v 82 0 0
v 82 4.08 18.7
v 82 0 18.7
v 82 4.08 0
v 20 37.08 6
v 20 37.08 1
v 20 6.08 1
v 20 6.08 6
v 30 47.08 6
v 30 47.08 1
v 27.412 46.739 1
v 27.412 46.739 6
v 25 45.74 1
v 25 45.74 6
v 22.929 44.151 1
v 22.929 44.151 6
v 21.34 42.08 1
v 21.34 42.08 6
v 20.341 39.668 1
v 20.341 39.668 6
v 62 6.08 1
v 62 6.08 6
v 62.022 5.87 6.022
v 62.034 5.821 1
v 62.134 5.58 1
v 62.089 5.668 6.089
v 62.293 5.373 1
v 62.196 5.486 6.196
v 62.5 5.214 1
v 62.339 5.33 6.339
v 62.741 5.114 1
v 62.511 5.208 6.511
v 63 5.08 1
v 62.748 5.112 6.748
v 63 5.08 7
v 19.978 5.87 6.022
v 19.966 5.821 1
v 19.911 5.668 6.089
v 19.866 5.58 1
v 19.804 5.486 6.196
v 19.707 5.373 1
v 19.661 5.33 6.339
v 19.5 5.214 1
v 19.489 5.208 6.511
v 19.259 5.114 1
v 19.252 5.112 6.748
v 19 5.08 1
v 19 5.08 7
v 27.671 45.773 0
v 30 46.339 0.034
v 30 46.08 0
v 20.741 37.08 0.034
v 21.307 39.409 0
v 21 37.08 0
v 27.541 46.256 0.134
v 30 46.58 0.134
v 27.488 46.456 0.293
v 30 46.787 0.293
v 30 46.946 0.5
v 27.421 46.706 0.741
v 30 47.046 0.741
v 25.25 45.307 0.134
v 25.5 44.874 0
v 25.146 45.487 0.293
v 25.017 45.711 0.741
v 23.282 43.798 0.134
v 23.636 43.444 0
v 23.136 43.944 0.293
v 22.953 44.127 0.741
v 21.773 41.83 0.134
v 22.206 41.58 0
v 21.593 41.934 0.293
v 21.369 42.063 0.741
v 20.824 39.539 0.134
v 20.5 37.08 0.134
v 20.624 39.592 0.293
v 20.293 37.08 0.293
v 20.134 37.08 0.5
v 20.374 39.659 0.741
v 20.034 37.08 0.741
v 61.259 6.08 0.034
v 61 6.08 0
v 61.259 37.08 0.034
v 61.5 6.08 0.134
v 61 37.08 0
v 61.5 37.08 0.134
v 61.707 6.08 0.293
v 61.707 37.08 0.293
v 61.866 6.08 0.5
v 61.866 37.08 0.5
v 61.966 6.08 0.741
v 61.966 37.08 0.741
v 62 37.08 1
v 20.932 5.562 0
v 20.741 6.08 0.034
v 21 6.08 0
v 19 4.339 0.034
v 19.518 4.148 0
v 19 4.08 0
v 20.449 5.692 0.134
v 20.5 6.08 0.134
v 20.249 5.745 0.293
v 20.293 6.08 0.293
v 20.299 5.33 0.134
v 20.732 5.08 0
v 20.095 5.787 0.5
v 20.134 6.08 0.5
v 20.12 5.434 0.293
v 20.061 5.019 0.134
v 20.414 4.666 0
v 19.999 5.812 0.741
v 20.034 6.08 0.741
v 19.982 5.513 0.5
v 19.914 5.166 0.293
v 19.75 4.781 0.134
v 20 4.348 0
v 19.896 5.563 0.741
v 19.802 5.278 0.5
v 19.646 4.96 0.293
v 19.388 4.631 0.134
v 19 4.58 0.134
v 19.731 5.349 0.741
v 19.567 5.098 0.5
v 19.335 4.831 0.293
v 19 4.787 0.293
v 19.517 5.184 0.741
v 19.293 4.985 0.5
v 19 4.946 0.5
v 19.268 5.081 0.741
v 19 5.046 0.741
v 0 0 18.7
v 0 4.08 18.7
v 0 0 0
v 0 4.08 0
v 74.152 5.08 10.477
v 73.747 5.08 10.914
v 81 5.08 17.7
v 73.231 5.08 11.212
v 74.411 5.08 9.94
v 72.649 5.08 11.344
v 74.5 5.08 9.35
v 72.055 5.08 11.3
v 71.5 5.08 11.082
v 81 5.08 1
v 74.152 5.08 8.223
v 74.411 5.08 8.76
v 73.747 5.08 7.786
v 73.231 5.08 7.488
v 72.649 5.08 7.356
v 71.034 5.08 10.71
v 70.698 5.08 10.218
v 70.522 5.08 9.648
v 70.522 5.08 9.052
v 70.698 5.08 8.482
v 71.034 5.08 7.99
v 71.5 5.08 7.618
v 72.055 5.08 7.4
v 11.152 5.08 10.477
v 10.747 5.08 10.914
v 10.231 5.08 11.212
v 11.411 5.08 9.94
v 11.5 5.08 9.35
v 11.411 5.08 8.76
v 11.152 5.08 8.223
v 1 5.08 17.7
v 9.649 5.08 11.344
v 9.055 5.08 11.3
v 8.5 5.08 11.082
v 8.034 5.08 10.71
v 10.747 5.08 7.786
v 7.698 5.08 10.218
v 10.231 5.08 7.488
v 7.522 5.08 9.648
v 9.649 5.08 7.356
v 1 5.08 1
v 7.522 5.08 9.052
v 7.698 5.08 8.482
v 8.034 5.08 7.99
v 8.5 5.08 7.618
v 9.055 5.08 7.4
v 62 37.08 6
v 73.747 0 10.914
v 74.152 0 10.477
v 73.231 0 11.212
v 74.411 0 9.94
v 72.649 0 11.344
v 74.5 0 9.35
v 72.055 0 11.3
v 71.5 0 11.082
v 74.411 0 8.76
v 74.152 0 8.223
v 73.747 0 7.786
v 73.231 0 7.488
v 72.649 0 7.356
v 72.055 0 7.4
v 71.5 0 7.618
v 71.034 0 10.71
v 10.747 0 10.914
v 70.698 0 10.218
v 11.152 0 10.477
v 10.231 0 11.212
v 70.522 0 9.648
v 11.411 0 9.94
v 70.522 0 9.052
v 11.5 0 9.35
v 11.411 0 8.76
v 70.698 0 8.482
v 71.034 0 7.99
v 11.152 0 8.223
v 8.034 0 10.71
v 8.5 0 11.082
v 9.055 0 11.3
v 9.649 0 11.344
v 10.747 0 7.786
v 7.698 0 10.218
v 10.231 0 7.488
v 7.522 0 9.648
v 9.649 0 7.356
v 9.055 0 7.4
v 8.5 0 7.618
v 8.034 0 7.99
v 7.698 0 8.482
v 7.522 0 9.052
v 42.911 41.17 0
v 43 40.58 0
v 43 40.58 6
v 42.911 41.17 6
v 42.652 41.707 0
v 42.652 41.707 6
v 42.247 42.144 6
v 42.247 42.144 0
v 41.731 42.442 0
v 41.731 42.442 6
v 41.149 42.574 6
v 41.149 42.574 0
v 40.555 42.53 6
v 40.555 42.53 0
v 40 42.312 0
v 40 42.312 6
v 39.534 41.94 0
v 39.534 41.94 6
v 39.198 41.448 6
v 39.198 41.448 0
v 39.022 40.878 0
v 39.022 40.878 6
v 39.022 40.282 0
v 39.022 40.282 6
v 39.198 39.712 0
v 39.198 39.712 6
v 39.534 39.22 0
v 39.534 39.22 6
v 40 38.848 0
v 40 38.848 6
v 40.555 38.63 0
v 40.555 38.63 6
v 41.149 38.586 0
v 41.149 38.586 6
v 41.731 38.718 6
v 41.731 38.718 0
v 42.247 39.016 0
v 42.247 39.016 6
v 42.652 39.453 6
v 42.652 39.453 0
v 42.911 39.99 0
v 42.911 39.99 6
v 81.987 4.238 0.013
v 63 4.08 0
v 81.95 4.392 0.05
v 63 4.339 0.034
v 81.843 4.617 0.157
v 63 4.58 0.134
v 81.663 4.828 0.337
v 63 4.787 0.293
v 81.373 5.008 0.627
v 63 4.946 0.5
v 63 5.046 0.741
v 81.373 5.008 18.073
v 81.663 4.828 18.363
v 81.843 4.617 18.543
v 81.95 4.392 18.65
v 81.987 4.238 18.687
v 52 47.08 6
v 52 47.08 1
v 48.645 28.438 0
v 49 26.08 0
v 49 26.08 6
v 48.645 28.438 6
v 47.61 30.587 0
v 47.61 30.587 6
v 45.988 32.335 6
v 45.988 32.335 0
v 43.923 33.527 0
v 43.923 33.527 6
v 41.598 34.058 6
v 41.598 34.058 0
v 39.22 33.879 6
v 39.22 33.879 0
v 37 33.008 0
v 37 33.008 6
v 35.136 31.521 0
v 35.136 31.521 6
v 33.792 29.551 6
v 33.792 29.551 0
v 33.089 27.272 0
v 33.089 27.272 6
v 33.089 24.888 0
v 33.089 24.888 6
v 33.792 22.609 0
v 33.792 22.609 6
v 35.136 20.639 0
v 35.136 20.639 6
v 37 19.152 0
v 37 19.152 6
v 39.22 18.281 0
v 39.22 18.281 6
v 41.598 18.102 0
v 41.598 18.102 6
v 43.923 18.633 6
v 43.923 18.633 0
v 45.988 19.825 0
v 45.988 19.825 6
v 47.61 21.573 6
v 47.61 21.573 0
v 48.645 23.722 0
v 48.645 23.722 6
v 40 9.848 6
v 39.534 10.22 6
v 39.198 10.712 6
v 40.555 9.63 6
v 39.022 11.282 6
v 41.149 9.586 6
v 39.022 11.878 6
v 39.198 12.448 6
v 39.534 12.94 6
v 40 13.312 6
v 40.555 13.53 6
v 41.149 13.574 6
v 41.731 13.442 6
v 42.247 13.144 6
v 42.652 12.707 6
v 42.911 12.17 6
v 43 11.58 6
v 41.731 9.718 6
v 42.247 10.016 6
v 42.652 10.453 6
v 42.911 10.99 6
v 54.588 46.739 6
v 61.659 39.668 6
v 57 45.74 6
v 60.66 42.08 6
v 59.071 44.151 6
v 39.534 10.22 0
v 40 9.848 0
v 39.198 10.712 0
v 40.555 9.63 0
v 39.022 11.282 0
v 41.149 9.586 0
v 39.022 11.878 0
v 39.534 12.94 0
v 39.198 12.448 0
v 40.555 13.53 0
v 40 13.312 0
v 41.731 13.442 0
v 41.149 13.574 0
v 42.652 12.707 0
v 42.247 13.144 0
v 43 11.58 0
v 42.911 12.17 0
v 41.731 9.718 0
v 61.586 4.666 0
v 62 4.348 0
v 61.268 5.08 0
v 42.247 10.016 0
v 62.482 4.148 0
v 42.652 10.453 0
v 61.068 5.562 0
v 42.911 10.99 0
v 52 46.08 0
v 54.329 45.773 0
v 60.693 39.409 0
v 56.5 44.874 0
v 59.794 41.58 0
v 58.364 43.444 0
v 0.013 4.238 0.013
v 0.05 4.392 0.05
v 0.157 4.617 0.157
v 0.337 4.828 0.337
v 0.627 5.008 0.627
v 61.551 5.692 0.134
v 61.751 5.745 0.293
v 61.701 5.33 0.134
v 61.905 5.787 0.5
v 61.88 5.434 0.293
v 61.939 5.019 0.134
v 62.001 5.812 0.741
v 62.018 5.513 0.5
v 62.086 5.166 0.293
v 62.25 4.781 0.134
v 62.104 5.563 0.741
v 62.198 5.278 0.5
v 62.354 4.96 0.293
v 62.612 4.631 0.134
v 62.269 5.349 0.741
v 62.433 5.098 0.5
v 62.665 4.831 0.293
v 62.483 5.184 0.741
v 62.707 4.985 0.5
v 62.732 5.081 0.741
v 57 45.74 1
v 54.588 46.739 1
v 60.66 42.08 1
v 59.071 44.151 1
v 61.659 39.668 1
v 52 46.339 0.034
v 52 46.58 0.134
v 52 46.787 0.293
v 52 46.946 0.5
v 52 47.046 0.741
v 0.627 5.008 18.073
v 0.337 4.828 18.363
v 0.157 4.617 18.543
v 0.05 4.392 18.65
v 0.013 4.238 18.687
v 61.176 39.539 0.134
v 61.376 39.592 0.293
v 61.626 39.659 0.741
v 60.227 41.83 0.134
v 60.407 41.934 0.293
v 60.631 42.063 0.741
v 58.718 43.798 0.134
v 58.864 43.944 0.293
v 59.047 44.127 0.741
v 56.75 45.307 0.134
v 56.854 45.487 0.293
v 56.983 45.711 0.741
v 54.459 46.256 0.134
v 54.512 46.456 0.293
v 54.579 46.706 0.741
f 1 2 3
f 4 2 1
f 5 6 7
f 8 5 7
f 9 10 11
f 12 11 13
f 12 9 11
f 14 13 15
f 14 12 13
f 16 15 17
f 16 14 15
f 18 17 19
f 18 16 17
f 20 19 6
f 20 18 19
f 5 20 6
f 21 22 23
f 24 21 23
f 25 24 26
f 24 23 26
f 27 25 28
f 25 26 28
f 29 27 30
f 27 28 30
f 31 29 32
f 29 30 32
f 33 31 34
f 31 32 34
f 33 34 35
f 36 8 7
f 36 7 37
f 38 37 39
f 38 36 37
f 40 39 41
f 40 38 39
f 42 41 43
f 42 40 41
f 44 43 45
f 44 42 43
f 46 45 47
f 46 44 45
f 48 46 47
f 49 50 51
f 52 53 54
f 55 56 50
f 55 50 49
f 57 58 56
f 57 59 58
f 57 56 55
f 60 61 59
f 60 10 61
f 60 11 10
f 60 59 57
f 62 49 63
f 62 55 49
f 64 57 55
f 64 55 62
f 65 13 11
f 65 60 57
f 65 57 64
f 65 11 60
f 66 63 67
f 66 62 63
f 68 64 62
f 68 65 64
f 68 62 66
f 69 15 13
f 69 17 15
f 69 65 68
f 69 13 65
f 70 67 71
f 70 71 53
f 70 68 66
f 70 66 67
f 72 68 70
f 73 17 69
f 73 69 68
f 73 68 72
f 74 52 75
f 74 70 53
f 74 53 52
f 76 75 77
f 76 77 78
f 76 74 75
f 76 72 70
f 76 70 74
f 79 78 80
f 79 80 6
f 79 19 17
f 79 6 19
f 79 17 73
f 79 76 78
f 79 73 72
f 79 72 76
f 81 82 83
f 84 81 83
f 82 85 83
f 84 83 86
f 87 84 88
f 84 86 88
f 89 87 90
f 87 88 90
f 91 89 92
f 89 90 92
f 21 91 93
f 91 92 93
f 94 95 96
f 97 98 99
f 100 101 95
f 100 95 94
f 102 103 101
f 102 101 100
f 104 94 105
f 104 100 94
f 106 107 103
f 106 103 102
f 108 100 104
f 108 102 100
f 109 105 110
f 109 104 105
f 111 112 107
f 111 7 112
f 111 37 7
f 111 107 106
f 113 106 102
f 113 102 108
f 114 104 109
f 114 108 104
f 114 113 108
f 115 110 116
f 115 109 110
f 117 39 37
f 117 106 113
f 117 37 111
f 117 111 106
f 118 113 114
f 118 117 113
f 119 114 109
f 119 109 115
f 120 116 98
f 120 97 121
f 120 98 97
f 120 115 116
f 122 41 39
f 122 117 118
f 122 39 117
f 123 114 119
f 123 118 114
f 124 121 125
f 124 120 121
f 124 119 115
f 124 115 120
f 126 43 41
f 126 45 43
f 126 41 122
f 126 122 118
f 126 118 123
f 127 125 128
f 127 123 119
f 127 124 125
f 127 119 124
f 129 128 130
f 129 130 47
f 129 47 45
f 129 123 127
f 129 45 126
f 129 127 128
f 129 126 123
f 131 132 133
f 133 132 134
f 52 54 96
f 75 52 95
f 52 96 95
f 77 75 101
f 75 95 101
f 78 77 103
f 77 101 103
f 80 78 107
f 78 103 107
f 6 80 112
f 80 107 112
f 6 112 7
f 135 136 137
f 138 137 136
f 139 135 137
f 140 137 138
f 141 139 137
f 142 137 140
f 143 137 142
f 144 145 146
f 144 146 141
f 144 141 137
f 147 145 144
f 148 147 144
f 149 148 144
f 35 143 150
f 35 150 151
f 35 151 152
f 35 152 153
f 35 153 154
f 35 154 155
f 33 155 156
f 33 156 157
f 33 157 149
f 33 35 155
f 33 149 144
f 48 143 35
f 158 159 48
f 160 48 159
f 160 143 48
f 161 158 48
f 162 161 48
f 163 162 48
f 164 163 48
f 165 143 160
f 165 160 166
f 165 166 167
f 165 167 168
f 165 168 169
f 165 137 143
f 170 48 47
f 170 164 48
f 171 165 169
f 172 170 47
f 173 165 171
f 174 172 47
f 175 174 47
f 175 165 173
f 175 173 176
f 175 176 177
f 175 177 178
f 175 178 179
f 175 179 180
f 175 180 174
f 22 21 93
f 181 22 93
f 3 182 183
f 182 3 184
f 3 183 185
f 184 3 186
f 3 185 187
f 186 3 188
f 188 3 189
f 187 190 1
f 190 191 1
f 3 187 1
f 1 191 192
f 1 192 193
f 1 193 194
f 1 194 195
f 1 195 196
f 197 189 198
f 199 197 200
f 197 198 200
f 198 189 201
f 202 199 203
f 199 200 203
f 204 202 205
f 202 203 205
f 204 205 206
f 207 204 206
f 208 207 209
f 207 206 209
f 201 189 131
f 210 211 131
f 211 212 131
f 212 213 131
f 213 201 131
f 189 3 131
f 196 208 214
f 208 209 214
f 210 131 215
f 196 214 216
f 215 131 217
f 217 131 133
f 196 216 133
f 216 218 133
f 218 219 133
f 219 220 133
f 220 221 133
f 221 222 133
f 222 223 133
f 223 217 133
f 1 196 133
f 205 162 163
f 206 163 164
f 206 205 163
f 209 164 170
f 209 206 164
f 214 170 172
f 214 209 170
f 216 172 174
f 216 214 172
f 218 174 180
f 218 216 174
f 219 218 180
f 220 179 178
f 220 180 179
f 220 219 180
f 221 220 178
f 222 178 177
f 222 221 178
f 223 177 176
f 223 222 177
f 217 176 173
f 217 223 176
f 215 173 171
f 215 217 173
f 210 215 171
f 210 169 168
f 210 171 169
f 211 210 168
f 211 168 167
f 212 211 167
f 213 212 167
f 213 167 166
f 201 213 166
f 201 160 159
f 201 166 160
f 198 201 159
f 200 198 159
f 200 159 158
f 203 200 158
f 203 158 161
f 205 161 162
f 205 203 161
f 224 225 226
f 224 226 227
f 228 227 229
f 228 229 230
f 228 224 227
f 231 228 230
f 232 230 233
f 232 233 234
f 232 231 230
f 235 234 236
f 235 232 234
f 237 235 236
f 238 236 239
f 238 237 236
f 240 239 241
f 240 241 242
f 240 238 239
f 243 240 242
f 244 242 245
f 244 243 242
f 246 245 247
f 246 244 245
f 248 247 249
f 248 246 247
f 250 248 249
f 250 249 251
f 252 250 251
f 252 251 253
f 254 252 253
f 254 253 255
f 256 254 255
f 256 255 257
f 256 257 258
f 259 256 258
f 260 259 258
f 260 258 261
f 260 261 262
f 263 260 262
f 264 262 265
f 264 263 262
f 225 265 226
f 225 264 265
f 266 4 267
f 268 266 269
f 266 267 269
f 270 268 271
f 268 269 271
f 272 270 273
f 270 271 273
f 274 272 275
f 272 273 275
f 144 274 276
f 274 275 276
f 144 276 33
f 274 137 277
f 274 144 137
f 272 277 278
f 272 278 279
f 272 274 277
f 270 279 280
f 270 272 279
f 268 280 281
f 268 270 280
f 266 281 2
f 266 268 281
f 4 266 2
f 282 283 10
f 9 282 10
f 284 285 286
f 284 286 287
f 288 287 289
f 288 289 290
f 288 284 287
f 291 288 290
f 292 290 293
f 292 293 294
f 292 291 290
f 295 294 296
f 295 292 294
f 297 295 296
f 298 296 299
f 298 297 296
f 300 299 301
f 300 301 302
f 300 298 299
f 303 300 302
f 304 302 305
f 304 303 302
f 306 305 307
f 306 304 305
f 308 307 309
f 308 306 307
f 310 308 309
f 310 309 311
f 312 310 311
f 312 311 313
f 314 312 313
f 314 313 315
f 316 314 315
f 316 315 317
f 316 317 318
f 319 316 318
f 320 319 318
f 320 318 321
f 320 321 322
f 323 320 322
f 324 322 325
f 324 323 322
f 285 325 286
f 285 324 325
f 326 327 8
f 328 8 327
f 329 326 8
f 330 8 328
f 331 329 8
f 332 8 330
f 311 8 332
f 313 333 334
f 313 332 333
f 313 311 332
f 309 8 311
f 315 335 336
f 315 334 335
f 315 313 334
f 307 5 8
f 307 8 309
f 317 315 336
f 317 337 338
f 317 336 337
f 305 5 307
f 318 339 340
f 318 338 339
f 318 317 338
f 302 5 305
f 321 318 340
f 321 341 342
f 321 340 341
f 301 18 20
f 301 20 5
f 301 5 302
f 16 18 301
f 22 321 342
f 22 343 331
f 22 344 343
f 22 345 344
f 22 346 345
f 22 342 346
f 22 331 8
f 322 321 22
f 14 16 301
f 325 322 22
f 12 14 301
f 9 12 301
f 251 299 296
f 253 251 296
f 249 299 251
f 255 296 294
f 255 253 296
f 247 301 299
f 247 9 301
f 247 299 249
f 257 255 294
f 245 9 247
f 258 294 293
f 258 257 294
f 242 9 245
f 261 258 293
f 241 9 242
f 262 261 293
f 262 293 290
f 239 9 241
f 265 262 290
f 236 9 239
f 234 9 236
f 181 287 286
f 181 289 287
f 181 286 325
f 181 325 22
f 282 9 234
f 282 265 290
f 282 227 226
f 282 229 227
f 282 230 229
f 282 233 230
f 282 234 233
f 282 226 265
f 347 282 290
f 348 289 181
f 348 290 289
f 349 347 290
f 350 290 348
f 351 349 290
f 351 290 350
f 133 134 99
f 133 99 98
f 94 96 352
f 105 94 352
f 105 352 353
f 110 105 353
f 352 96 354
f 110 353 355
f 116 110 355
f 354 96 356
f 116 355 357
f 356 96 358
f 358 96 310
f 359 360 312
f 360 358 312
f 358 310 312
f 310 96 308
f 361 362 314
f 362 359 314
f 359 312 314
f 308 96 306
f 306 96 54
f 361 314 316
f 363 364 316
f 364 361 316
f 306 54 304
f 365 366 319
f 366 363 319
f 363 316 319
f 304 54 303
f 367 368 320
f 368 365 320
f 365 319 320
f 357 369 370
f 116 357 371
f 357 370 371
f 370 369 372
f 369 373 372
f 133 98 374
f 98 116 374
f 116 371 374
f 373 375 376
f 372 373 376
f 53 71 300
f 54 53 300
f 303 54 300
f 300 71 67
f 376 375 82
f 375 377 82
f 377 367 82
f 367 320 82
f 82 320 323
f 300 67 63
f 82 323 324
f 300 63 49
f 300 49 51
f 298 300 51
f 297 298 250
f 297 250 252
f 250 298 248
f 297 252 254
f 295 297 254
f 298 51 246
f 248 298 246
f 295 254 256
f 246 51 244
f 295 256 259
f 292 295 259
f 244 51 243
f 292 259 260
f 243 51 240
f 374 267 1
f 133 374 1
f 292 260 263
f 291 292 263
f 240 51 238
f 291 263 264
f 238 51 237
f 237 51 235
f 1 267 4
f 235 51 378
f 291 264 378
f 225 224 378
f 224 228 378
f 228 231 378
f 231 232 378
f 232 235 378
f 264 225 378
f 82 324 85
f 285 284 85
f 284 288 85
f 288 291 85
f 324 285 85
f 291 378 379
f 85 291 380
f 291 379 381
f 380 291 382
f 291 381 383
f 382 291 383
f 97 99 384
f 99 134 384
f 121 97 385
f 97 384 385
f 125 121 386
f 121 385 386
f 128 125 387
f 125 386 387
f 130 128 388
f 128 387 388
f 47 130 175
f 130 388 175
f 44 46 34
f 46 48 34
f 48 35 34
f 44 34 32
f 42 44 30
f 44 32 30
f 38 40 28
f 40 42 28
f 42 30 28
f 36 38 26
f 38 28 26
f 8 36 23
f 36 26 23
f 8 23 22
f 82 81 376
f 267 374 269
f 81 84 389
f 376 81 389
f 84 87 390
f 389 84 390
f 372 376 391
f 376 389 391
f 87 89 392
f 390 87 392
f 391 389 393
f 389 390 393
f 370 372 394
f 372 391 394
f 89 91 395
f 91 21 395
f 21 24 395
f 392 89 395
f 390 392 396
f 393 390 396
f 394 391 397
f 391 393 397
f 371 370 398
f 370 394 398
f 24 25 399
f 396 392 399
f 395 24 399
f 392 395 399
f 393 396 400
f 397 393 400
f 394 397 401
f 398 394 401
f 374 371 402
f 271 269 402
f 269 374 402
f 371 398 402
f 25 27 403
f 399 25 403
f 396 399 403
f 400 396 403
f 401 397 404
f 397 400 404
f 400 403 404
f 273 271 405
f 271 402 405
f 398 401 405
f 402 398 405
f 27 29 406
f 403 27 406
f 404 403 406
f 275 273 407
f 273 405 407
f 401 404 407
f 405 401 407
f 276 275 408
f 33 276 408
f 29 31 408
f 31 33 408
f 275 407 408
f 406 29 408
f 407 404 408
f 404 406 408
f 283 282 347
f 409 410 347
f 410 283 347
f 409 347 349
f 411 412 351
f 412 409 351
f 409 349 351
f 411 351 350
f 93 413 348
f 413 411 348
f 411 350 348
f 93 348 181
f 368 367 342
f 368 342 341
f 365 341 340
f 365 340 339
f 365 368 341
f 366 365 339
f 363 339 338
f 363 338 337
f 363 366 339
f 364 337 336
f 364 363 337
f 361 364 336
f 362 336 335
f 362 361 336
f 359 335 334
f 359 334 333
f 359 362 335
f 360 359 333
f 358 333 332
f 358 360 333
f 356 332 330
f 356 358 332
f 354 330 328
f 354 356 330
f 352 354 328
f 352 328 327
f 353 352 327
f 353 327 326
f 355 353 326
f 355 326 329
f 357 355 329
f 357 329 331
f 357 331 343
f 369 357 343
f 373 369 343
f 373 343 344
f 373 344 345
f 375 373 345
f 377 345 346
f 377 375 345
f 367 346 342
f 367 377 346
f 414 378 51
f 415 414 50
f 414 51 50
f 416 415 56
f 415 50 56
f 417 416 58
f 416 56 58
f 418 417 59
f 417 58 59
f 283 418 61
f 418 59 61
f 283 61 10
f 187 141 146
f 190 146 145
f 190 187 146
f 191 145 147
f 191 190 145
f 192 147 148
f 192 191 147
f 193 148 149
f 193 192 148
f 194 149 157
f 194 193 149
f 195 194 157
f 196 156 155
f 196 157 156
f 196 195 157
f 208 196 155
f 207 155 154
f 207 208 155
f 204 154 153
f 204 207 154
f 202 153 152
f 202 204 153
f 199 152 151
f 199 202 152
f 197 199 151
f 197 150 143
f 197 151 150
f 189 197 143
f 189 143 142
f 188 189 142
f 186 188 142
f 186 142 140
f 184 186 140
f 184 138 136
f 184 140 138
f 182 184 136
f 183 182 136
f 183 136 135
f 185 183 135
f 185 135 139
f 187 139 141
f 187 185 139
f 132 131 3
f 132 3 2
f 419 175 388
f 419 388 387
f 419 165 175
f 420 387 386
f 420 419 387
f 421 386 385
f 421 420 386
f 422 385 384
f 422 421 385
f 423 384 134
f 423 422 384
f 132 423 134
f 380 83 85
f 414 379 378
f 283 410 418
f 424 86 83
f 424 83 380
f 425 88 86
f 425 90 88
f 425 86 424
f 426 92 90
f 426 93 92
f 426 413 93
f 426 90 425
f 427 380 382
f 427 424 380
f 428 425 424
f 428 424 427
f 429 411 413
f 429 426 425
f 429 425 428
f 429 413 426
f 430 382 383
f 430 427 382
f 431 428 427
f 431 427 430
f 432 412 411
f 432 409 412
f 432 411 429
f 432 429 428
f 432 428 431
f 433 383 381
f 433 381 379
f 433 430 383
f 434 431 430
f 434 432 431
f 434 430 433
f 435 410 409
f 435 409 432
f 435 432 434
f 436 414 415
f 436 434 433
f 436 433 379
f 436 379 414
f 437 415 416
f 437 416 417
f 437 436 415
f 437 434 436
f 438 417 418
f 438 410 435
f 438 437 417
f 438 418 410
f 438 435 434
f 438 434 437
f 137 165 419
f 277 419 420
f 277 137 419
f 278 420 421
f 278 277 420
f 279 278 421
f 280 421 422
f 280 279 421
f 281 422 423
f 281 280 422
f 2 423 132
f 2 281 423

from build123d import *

# Parameters (mm, degrees)
SKETCH1_R           = 2
SKETCH1_R_2         = 8
BOSS_EXTRUDE1_DEPTH = 6
SKETCH2_W           = 12.7
SKETCH2_H           = 5.08
BOSS_EXTRUDE2_DEPTH = 82
FILLET1_R           = 10
FILLET2_R           = 10
FILLET4_R           = 1
SKETCH3_R           = 2
CUT_EXTRUDE1_DEPTH  = 6


with BuildPart() as part:
    # Sketch1 → Boss-Extrude1 (new body)
    with BuildSketch(Plane.XY):
        Polygon((0, 0), (82, 0), (82, 5.08), (62, 5.08), (62, 47.08), (20, 47.08), (20, 5.08), (0, 5.08), align=None)
        with Locations((41, 40.58)):
            Circle(SKETCH1_R, mode=Mode.SUBTRACT)
        with Locations((41, 11.58)):
            Circle(SKETCH1_R, mode=Mode.SUBTRACT)
        with Locations((41, 26.08)):
            Circle(SKETCH1_R_2, mode=Mode.SUBTRACT)
    extrude(amount=BOSS_EXTRUDE1_DEPTH)

    # Sketch2 → Boss-Extrude2 (add, through all)
    with BuildSketch(Plane(origin=(0, 0, 0), x_dir=(0, 0, -1), z_dir=(1, 0, 0))):
        with Locations((-12.35, 2.54)):
            Rectangle(SKETCH2_W, SKETCH2_H)
    extrude(amount=BOSS_EXTRUDE2_DEPTH)

    # Fillet1
    fillet1_edges = [part.edges().sort_by_distance(p)[0] for p in [
        (20, 47.08, 3),
    ]]
    fillet(fillet1_edges, radius=FILLET1_R)

    # Fillet2
    fillet2_edges = [part.edges().sort_by_distance(p)[0] for p in [
        (62, 47.08, 3),
    ]]
    fillet(fillet2_edges, radius=FILLET2_R)

    # Fillet4
    fillet4_edges = [part.edges().sort_by_distance(p)[0] for p in [
        (0, 5.08, 9.35),
        (20, 5.08, 3),
        (62, 5.08, 3),
        (82, 5.08, 9.35),
        (41, 5.08, 6),
        (41, 5.08, 18.7),
        (20, 21.08, 0),
        (22.928932188, 44.151067812, 0),
        (41, 47.08, 0),
        (59.071067812, 44.151067812, 0),
        (10, 5.08, 0),
        (62, 21.08, 0),
        (72, 5.08, 0),
    ]]
    fillet(fillet4_edges, radius=FILLET4_R)

    # Sketch3 → Cut-Extrude1 (cut)
    with BuildSketch(Plane(origin=(0, 0, 0), x_dir=(1, 0, 0), z_dir=(0, 1, 0))):
        with Locations((9.5, -9.35)):
            Circle(SKETCH3_R)
        with Locations((72.5, -9.35)):
            Circle(SKETCH3_R)
    extrude(amount=CUT_EXTRUDE1_DEPTH, mode=Mode.SUBTRACT)


solid = part.part
